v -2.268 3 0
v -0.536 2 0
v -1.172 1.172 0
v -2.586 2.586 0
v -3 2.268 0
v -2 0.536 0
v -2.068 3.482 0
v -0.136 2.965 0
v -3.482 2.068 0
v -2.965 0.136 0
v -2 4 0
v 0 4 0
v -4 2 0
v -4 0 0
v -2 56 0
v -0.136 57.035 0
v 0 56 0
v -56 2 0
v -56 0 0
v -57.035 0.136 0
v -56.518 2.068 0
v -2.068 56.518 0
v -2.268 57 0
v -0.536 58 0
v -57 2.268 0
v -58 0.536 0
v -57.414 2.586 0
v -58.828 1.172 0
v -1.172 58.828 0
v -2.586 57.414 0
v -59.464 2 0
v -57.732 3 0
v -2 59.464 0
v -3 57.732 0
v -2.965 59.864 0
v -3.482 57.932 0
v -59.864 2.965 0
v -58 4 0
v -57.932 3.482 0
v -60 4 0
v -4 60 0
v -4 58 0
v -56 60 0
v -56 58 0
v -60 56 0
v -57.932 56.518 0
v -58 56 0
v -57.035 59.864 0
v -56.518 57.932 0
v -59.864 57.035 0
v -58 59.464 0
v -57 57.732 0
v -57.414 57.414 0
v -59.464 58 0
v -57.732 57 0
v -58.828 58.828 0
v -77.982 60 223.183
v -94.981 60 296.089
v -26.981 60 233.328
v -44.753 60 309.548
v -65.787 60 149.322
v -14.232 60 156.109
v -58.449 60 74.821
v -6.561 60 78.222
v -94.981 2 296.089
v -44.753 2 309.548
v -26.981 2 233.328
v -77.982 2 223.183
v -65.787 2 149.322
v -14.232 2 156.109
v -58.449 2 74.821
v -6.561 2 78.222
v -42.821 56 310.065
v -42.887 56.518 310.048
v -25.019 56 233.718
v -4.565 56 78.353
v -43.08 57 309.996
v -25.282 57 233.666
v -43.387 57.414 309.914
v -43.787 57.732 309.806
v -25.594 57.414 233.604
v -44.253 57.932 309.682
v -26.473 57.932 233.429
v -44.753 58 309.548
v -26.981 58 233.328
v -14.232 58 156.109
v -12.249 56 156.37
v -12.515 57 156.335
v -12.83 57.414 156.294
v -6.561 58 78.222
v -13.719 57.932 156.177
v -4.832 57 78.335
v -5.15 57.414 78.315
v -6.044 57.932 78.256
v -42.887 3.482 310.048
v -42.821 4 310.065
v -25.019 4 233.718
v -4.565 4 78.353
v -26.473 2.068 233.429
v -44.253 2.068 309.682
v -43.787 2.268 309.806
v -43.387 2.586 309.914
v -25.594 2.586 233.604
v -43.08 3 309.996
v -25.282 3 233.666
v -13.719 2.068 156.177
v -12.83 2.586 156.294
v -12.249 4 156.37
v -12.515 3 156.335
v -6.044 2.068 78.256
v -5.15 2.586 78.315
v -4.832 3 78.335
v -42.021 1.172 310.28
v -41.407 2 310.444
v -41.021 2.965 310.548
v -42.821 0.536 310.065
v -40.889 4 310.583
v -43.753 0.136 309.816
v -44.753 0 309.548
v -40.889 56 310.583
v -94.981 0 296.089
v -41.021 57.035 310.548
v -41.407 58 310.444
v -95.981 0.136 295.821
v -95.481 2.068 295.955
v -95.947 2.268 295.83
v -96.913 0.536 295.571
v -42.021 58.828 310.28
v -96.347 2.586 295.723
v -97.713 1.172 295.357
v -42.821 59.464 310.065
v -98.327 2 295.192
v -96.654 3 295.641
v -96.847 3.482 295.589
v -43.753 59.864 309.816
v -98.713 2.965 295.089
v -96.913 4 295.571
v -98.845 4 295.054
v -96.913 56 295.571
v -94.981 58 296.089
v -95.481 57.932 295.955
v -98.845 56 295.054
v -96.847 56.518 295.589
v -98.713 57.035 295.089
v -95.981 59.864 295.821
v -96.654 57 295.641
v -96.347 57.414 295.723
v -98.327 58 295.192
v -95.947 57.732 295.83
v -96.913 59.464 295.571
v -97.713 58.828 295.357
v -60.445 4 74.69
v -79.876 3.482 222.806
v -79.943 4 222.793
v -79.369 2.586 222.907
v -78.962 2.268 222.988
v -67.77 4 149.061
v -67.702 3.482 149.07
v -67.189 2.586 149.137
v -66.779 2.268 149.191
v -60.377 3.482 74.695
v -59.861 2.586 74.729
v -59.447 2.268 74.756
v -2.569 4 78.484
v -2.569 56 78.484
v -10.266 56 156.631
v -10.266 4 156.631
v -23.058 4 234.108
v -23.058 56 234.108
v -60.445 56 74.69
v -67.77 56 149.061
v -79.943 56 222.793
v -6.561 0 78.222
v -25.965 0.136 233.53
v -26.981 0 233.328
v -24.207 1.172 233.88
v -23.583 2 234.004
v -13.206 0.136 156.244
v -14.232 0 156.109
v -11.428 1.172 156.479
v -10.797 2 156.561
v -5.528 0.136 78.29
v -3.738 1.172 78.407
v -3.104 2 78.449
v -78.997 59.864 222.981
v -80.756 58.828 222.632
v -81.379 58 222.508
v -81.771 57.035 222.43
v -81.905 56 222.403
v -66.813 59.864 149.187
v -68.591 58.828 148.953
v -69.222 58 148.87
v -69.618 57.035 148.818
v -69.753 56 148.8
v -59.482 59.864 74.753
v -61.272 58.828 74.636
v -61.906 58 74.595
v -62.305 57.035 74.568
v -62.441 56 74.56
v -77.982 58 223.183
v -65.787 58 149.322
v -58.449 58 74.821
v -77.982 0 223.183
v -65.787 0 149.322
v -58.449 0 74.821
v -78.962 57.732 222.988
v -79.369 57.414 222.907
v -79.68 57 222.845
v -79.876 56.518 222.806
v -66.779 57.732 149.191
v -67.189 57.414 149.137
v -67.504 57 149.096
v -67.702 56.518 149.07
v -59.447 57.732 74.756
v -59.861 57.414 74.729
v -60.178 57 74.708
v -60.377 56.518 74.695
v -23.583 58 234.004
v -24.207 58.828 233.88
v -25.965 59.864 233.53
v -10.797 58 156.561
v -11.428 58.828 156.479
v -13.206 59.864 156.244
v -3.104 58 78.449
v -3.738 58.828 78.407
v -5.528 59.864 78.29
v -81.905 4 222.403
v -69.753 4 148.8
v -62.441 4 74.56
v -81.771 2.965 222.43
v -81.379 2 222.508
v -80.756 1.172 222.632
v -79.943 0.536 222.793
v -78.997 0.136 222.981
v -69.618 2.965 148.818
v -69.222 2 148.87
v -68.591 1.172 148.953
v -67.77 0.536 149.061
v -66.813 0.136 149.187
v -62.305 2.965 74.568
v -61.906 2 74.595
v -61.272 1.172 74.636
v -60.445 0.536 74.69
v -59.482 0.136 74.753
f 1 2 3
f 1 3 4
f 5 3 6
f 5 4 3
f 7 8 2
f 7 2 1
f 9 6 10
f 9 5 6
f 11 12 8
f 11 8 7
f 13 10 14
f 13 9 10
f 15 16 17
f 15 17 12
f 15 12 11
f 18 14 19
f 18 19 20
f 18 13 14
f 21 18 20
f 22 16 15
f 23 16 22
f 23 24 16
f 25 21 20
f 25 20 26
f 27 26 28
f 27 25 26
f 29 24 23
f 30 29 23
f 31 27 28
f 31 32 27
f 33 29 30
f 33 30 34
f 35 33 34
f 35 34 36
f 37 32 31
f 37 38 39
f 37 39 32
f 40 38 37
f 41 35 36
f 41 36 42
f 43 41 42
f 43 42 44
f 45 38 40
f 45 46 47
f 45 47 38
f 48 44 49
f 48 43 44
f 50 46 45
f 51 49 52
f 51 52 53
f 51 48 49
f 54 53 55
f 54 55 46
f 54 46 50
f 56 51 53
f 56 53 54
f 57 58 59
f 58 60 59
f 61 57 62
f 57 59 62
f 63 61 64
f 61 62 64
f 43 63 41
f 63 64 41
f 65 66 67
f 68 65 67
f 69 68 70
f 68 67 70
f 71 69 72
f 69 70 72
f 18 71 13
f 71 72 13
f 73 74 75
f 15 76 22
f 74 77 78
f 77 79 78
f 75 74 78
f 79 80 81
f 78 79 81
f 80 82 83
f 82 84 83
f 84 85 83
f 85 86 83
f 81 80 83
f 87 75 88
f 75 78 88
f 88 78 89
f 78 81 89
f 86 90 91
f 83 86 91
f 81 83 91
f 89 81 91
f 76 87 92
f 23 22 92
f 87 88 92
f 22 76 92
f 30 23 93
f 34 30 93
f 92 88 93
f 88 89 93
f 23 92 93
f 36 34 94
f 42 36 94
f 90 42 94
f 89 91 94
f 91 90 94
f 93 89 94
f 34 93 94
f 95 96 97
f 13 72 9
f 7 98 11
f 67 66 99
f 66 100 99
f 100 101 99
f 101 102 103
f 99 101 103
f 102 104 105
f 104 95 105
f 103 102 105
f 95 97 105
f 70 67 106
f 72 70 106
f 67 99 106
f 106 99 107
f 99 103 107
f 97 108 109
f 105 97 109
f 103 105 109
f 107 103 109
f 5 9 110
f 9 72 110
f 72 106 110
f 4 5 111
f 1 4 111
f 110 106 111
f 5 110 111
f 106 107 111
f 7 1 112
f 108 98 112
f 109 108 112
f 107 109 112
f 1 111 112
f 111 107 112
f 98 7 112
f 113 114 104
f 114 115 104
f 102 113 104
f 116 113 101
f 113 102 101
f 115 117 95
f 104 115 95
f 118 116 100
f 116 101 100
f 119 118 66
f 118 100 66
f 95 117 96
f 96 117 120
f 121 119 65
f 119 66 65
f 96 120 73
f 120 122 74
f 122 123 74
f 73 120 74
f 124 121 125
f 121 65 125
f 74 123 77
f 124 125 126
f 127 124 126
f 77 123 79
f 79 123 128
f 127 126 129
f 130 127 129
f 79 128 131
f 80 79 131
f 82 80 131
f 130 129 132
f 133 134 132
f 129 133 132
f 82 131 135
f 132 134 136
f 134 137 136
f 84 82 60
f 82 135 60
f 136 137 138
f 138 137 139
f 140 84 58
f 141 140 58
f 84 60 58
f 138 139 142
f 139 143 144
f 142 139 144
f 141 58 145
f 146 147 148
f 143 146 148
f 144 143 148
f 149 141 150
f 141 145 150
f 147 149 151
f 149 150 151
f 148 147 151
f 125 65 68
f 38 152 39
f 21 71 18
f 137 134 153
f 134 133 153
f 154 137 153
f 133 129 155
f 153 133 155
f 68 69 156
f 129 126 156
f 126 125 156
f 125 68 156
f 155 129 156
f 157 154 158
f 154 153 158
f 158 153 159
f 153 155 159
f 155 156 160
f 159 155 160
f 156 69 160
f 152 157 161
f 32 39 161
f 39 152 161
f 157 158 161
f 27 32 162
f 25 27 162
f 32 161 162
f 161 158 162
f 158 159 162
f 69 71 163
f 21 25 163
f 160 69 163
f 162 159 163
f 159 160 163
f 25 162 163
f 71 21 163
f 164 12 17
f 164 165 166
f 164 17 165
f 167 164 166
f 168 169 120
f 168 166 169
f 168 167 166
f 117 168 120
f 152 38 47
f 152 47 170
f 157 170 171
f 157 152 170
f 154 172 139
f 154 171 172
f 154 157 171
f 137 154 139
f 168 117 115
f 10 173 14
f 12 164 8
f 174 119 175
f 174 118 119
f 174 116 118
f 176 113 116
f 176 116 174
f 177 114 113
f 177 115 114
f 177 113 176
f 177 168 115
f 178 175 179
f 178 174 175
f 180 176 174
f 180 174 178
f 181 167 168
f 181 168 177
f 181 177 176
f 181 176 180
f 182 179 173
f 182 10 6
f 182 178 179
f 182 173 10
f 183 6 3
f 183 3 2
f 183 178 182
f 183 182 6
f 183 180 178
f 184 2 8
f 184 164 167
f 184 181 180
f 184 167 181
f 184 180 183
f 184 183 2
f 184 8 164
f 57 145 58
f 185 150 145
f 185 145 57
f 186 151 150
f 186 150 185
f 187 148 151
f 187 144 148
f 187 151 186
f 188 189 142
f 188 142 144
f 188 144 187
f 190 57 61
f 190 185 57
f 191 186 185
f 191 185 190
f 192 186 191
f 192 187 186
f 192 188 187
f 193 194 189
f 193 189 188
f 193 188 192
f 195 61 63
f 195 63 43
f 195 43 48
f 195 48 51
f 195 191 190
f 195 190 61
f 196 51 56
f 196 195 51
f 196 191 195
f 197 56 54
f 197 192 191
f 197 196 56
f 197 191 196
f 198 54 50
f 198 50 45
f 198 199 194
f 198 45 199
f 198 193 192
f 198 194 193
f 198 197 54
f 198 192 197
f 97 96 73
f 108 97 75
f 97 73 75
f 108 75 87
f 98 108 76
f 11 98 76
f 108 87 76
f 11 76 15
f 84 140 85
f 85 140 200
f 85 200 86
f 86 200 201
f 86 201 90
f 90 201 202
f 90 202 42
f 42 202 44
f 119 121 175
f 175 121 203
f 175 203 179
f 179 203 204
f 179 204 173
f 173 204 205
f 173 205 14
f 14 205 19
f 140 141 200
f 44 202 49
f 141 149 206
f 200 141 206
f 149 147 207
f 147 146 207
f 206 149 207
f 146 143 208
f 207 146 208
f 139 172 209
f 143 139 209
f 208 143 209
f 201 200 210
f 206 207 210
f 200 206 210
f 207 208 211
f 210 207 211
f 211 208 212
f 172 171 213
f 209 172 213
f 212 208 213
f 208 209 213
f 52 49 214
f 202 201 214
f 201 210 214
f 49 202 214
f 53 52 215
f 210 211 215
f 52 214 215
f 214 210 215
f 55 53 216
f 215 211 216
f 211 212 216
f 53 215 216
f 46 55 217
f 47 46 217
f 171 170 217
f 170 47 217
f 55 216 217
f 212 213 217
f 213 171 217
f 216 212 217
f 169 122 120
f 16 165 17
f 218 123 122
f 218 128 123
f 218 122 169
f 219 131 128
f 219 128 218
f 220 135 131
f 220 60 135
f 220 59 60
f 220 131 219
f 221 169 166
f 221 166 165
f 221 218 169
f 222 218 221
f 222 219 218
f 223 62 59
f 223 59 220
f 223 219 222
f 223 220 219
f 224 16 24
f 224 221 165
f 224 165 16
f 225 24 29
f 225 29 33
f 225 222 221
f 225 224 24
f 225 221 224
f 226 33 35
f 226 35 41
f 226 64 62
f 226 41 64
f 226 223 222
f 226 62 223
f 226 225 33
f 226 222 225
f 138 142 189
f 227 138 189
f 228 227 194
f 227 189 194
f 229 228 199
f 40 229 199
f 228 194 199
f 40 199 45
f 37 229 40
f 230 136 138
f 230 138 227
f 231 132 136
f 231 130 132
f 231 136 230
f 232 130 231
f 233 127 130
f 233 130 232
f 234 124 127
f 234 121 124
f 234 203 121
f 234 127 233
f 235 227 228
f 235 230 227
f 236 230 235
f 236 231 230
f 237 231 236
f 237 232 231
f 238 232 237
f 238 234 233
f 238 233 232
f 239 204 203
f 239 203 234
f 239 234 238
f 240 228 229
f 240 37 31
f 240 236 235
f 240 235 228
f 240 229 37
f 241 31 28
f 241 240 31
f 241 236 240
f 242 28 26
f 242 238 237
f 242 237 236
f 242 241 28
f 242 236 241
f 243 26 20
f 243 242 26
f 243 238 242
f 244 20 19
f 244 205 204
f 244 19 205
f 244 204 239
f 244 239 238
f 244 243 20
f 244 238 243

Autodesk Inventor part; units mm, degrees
ref_plane "Start plane" through (0, 0, 0) normal (0, 0, 1) x (1, 0, 0)
ref_plane "End plane" through (0, 0, 306.305284) normal (0, 0, 1) x (1, 0, 0)
sketch "Sketch" plane through (-30, 30, 0) normal (0, 0, -1) x (-1, 0, 0)
  line L0 (-30, -26) -> (-30, 26)
  line L1 (-26, 30) -> (26, 30)
  line L2 (30, 26) -> (30, -26)
  line L3 (26, -30) -> (-26, -30)
  arc A0 (-30, -26) -> (-26, -30) centre (-26, -26) ccw
  arc A1 (30, 26) -> (26, 30) centre (26, 26) ccw
  arc A2 (-26, 30) -> (-30, 26) centre (-26, 26) ccw
  arc A3 (26, -30) -> (30, -26) centre (26, -26) ccw
  arc A4 (-26, 28) -> (-28, 26) centre (-26, 26) ccw
  line L4 (-26, 28) -> (26, 28)
  arc A5 (28, 26) -> (26, 28) centre (26, 26) ccw
  line L5 (28, 26) -> (28, -26)
  arc A6 (26, -28) -> (28, -26) centre (26, -26) ccw
  line L6 (26, -28) -> (-26, -28)
  arc A7 (-28, -26) -> (-26, -28) centre (-26, -26) ccw
  line L7 (-28, -26) -> (-28, 26)
  line L8 (0, 37.102134) -> (0, -37.102134) construction
  line L9 (-23.102134, 0) -> (23.102134, 0) construction
  dimension "d7" = 4
  dimension "d9" = 60
  dimension "d11" = 60
  dimension "d12" = 2
  dimension "d15" = 30
  dimension "d16" = 30
sketch "Sketch3" plane through (0, 0, 0) normal (0, 0, 1) x (1, 0, 0)
  line L0 (0, 0) -> (10, 0)
ref_plane "Work Plane3" through (0, 0, 0) normal (0, -1, 0) x (1, 0, 0)
sketch "Sketch4" plane through (0, 0, 0) normal (0, -1, 0) x (1, 0, 0)
  line L0 (-2, 0) -> (12, 0)
  line L1 (-120.61347, 306.305284) -> (31.768912, 306.305284)
  dimension "d18" = 306.30528
ref_plane "Orientation Work Plane" through (-30, 30, 0) normal (0, 0, -1) x (-1, 0, 0)
sketch3d "Sweep Path"
  arc A0 (-40.889008, 0, 310.582854) -> (0, 0, 0) centre (-1200, 0, 0) ccw
sweep "Body" add profiles "Sketch" path "Sweep Path"
equation "\"d7\" = G_IR"
equation "\"d9\" = G_W"
equation "\"d11\" = G_H"
equation "\"d12\" = G_T"
equation "\"d15\" = 0.5 * d9"
equation "\"d16\" = 0.5 * d11"
equation "\"G_W\" = 60"
equation "\"G_H\" = 60"
equation "\"G_T\" = 2"
equation "\"G_IR\" = 4"
equation "\"G_L\" = d18"
equation "\"G_OFFSET_START\" = 0"
equation "\"G_OFFSET_END\" = 0"
equation "\"d14\" = G_OFFSET_END + B_L"
equation "\"B_L\" = 306.30528"
properties part number "ISO 4019 - 60x60x2 - 306.305" material "Steel, Mild"
